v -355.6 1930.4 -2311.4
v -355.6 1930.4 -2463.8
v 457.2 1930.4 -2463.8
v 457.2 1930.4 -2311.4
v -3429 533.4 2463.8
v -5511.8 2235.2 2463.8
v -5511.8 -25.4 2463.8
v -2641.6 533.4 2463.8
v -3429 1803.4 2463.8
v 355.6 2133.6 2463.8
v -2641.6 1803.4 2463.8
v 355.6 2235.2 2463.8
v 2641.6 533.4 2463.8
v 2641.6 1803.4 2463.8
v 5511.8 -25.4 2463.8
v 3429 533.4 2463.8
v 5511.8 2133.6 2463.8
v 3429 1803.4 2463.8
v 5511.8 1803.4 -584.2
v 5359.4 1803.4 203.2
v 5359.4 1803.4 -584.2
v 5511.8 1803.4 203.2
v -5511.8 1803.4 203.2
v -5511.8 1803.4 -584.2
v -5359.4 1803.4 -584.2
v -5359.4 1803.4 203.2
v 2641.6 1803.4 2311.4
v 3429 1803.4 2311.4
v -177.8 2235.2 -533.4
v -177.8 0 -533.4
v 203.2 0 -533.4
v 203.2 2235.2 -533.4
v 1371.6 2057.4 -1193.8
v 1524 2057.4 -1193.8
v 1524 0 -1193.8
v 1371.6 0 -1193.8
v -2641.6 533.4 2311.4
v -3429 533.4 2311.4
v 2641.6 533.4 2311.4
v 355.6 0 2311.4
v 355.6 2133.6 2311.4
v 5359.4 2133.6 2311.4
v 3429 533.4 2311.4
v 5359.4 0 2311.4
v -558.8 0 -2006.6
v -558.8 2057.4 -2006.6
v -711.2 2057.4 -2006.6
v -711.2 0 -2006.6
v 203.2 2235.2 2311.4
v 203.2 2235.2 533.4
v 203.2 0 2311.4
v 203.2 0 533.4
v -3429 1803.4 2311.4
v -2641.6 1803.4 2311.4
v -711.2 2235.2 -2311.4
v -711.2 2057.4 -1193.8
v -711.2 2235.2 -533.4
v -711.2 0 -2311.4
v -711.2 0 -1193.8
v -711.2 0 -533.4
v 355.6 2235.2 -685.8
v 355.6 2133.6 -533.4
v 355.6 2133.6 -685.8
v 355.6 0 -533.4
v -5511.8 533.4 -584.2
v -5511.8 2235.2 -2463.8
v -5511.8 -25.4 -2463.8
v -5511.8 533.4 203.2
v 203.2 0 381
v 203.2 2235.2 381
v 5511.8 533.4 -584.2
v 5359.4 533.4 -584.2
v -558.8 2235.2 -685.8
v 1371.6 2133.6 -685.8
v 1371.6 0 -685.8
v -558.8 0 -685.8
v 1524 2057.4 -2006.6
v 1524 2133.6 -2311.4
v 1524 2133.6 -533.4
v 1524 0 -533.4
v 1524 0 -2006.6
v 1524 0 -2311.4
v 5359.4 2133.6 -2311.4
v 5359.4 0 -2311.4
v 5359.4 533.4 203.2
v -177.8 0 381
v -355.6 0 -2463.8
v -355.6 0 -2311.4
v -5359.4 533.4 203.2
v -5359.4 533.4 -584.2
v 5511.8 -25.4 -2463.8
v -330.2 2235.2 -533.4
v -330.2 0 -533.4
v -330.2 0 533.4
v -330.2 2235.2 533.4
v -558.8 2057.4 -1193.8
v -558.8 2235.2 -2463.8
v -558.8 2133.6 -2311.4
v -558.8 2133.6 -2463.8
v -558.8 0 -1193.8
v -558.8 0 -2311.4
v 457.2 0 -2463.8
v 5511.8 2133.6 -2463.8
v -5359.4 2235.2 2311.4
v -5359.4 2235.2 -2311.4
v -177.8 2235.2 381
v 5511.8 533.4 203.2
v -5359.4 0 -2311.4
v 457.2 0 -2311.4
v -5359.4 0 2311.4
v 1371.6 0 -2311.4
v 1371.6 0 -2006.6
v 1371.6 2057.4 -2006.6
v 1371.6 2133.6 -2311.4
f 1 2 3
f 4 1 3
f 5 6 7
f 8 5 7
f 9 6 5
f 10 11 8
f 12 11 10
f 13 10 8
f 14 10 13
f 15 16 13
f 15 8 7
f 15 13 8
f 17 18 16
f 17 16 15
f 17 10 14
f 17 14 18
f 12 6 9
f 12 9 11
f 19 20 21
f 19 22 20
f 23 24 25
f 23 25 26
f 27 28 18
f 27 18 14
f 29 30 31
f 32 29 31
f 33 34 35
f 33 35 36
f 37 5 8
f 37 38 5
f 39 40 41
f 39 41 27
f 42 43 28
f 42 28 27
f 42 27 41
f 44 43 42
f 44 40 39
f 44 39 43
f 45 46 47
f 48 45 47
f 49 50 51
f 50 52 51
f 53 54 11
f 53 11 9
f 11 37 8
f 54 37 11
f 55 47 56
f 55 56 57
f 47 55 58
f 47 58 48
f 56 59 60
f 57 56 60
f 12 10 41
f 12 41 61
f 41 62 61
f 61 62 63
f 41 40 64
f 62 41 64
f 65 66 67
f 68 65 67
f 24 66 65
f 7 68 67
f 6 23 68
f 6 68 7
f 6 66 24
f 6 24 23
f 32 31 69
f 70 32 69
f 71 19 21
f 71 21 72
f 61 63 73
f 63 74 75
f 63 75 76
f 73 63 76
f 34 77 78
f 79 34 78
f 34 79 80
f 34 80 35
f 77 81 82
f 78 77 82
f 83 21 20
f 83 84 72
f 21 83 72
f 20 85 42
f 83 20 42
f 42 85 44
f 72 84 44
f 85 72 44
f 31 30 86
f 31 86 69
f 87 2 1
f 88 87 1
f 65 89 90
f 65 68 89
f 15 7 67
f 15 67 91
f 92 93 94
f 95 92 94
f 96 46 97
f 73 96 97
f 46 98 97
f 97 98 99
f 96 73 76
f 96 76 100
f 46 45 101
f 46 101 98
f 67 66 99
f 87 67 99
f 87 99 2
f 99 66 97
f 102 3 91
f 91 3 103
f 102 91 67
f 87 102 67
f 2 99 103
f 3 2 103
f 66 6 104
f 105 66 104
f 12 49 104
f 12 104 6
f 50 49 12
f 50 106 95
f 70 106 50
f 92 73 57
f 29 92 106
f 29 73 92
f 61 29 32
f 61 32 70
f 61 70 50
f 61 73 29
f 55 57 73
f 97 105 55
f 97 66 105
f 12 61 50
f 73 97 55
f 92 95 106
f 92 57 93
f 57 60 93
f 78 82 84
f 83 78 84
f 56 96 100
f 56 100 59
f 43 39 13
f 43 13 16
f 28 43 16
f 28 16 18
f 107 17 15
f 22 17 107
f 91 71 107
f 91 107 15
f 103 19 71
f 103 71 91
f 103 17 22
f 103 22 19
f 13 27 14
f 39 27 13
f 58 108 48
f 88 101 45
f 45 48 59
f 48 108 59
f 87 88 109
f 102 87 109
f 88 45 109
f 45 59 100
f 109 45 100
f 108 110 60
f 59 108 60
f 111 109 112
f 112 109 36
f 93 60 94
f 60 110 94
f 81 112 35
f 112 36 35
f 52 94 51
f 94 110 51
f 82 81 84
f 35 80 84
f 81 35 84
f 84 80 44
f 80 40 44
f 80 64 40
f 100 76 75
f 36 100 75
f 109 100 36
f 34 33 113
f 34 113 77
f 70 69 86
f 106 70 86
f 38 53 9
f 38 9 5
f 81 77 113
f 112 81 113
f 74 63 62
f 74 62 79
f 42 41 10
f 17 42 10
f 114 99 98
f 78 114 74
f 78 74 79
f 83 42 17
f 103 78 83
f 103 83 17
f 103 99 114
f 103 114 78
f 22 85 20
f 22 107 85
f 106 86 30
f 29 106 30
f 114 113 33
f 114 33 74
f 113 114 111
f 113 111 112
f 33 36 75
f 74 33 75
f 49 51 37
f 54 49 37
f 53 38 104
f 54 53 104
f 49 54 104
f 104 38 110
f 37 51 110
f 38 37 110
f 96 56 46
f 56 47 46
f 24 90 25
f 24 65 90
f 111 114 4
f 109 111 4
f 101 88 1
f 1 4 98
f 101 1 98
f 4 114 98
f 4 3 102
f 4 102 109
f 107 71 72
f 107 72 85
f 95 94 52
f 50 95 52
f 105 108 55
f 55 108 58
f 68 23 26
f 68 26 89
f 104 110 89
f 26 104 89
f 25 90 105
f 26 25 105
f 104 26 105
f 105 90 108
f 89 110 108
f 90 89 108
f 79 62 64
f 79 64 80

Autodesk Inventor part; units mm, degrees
ref_plane "YZ Plane" through (0, 0, 0) normal (1, 0, 0) x (0, 1, 0)
ref_plane "XZ Plane" through (0, 0, 0) normal (0, 1, 0) x (-1, 0, 0)
ref_plane "XY Plane" through (0, 0, 0) normal (0, 0, 1) x (1, 0, 0)
sketch "Sketch1" plane through (0, 0, 0) normal (0, 1, 0) x (-1, 0, 0)
  line L0 (2008.4767, 2311.4) -> (5359.4, 2311.4)
  line L1 (-5511.8, 2463.8) -> (1195.6767, 2463.8)
  line L2 (2008.4767, 2463.8) -> (5511.8, 2463.8)
  line L3 (5359.4, 2311.4) -> (5359.4, -2311.4)
  line L4 (128.8767, 2311.4) -> (1195.6767, 2311.4)
  line L5 (2008.4767, 2311.4) -> (5359.4, 2311.4)
  line L6 (-5359.4, 2311.4) -> (-1041.4, 2311.4)
  line L7 (-5359.4, -2311.4) -> (-5359.4, 2311.4)
  line L8 (-988.7233, -2463.8) -> (-5306.7233, -2463.8)
  line L9 (5359.4, -2311.4) -> (1955.8, -2311.4)
  line L10 (355.6, -2463.8) -> (1143, -2463.8)
  line L11 (1955.8, -2463.8) -> (5359.4, -2463.8)
  line L12 (5359.4, 2311.4) -> (5359.4, -2311.4)
  line L13 (-5359.4, -2311.4) -> (-5359.4, 2311.4)
  line L14 (128.8767, 2311.4) -> (1195.6767, 2311.4)
  line L15 (-5359.4, 2311.4) -> (-1041.4, 2311.4)
  line L16 (1955.8, -2311.4) -> (5359.4, -2311.4)
  line L17 (5359.4, -2311.4) -> (5359.4, 2311.4)
  line L18 (5359.4, 2311.4) -> (2008.4767, 2311.4)
  line L19 (2008.4767, 2463.8) -> (5511.8, 2463.8)
  line L20 (-457.2, -2463.8) -> (-457.2, -2311.4)
  line L21 (355.6, -2463.8) -> (355.6, -2311.4)
  line L22 (-7716.52, 0) -> (7716.52, 0) projected
  line L23 (-5511.8, 2463.8) -> (-5511.8, -2463.8)
  line L24 (-5306.7233, -2463.8) -> (-5511.8, -2463.8)
  line L25 (5511.8, 2463.8) -> (5511.8, -2463.8)
  line L26 (5511.8, -2463.8) -> (5359.4, -2463.8)
  line L27 (-988.7233, -2463.8) -> (-457.2, -2463.8)
  line L28 (-1371.6, -685.8) -> (558.8, -685.8)
  line L29 (558.8, -2311.4) -> (355.6, -2311.4)
  line L30 (-457.2, -2311.4) -> (-1371.6, -2311.4)
  line L31 (-1371.6, -2311.4) -> (-457.2, -2311.4)
  line L32 (355.6, -2311.4) -> (558.8, -2311.4)
  line L33 (-355.6, -533.4) -> (-355.6, 2311.4)
  line L34 (1143, -2311.4) -> (1955.8, -2311.4)
  line L35 (1955.8, -2463.8) -> (1143, -2463.8)
  line L36 (0, -3449.32) -> (0, 3449.32) projected
  line L37 (1195.6767, 2463.8) -> (2008.4767, 2463.8)
  line L38 (2008.4767, 2311.4) -> (1195.6767, 2311.4)
  line L39 (355.6, -2463.8) -> (5511.8, -2463.8)
  line L40 (1143, -2311.4) -> (711.2, -2311.4)
  line L41 (558.8, -2311.4) -> (355.6, -2311.4)
  line L42 (-1041.4, -2311.4) -> (-1371.6, -2311.4)
  line L43 (-1524, -2311.4) -> (-5359.4, -2311.4)
  line L44 (-203.2, 533.4) -> (330.2, 533.4)
  line L45 (330.2, 533.4) -> (330.2, -533.4)
  line L46 (-1524, -2006.6) -> (-1371.6, -2006.6)
  line L47 (-1524, -1193.8) -> (-1371.6, -1193.8)
  line L48 (558.8, -1193.8) -> (711.2, -1193.8)
  line L49 (558.8, -2006.6) -> (711.2, -2006.6)
  line L50 (-1371.6, -2311.4) -> (-1371.6, -2006.6)
  line L51 (-1371.6, -1193.8) -> (-1371.6, -685.8)
  line L52 (-1524, -533.4) -> (-1524, -1193.8)
  line L53 (-1524, -2006.6) -> (-1524, -2311.4)
  line L54 (558.8, -685.8) -> (558.8, -1193.8)
  line L55 (558.8, -2006.6) -> (558.8, -2311.4)
  line L56 (711.2, -2311.4) -> (711.2, -2006.6)
  line L57 (711.2, -1193.8) -> (711.2, -533.4)
  line L58 (-203.2, -533.4) -> (177.8, -533.4)
  line L59 (177.8, -533.4) -> (177.8, 381)
  line L60 (177.8, 381) -> (-203.2, 381)
  line L61 (-203.2, 381) -> (-203.2, -533.4)
  line L62 (1195.6767, 2311.4) -> (-203.2, 2311.4)
  line L63 (-355.6, 2311.4) -> (-5359.4, 2311.4)
  line L64 (-23.5233, 2311.4) -> (-203.2, 2311.4)
  line L65 (-355.6, 2311.4) -> (-889, 2311.4)
  line L66 (-889, 2311.4) -> (-355.6, 2311.4)
  line L67 (-203.2, 2311.4) -> (-23.5233, 2311.4)
  line L68 (-203.2, 2311.4) -> (-203.2, 533.4)
  line L69 (-203.2, 381) -> (-203.2, -533.4)
  line L70 (711.2, -533.4) -> (330.2, -533.4)
  line L71 (177.8, -533.4) -> (-203.2, -533.4)
  line L72 (-355.6, -533.4) -> (-1524, -533.4)
  point P0 (0, 0)
  point P1 (0, 0)
  dimension "d0" = 152.4
  dimension "d8" = 152.4
  dimension "d12" = 11023.6
  dimension "d14" = 152.4
  dimension "d15" = 152.4
  dimension "d23" = 5054.6
  dimension "d29" = 4927.6
  dimension "d30" = 152.4
  dimension "d32" = 5029.2
  dimension "d33" = 304.8
  dimension "d34" = 1117.6
  dimension "d35" = 304.8
  dimension "d36" = 1117.6
  dimension "d37" = 152.4
  dimension "d38" = 3835.4
  dimension "d40" = 152.4
  dimension "d41" = 812.8
  dimension "d42" = 4648.2
  dimension "d73" = 152.4
  dimension "d74" = 152.4
  dimension "d75" = 152.4
  dimension "d77" = 2844.8
  dimension "d78" = 152.4
  dimension "d79" = 5562.6
  dimension "d80" = 1778
extrude "Extrusion12" add sketch "Sketch1" along normal blind 2133.6 contours L38 L4 L62 L36 L1 L37 L2 L25 L22 L3 L0 | L22 L25 L26 L11 L35 L10 L21 L29 L55 L49 L56 L40 L34 L9 L3 | L45 L70 L57 L48 L54 L28 L36 L58 L59 L22 | L22 L59 L60 L36 L44 L45 | L62 L68 L44 L36 L60 L61 L22 L33 L63 L6 L7 L23 L1 | L61 L58 L36 L28 L51 L47 L52 L72 L33 L22 | L22 L7 L43 L53 L46 L50 L30 L20 L27 L8 L24 L23
sketch "Sketch10" plane through (0, 0, 0) normal (0, -1, 0) x (1, 0, 0)
  line L0 (-5511.8, 2463.8) -> (5511.8, 2463.8)
  line L1 (5511.8, 2463.8) -> (5511.8, -2463.8)
  line L2 (5511.8, -2463.8) -> (-5511.8, -2463.8)
  line L3 (-5511.8, -2463.8) -> (-5511.8, 2463.8)
  point P0 (0, 0)
extrude "Extrusion13" add sketch "Sketch10" along normal blind 25.4
sketch "Sketch11" plane through (0, 2133.6, 0) normal (0, 1, 0) x (1, 0, 0)
  line L0 (1371.6, 685.8) -> (-558.8, 685.8) projected
  line L1 (-355.6, 2463.8) -> (-5511.8, 2463.8) projected
  line L2 (355.6, 533.4) -> (355.6, 685.8)
  line L3 (-558.8, 2463.8) -> (-558.8, 2311.4)
  line L4 (-558.8, 2006.6) -> (-711.2, 2006.6)
  line L5 (-711.2, 2006.6) -> (-711.2, 1193.8)
  line L6 (-711.2, 1193.8) -> (-558.8, 1193.8)
  line L7 (-558.8, 1193.8) -> (-558.8, 2006.6)
  line L8 (1371.6, 1193.8) -> (1524, 1193.8)
  line L9 (1524, 1193.8) -> (1524, 2006.6)
  line L10 (1524, 2006.6) -> (1371.6, 2006.6)
  line L11 (1371.6, 2006.6) -> (1371.6, 1193.8)
  line L12 (-5511.8, -2463.8) -> (5511.8, -2463.8) projected
  line L13 (355.6, -2311.4) -> (355.6, -2463.8)
  line L14 (203.2, 533.4) -> (203.2, -381) projected
  line L15 (203.2, -381) -> (-177.8, -381) projected
  line L16 (-177.8, -381) -> (-177.8, 533.4) projected
  line L17 (-177.8, 533.4) -> (203.2, 533.4) projected
  line L18 (-5511.8, -2463.8) -> (5511.8, -2463.8) projected
  line L19 (5511.8, -2463.8) -> (5511.8, 2463.8) projected
  line L20 (5511.8, 2463.8) -> (457.2, 2463.8) projected
  line L21 (457.2, 2463.8) -> (457.2, 2311.4) projected
  line L22 (457.2, 2311.4) -> (1371.6, 2311.4) projected
  line L23 (1371.6, 2311.4) -> (1371.6, 2006.6) projected
  line L24 (1371.6, 2006.6) -> (1524, 2006.6) projected
  line L25 (1524, 2006.6) -> (1524, 2311.4) projected
  line L26 (1524, 2311.4) -> (5359.4, 2311.4) projected
  line L27 (5359.4, 2311.4) -> (5359.4, -2311.4) projected
  line L28 (5359.4, -2311.4) -> (355.6, -2311.4) projected
  line L29 (355.6, -2311.4) -> (355.6, 533.4) projected
  line L30 (355.6, 533.4) -> (1524, 533.4) projected
  line L31 (1524, 533.4) -> (1524, 1193.8) projected
  line L32 (1524, 1193.8) -> (1371.6, 1193.8) projected
  line L33 (1371.6, 1193.8) -> (1371.6, 685.8) projected
  line L34 (1371.6, 685.8) -> (-558.8, 685.8) projected
  line L35 (-558.8, 685.8) -> (-558.8, 1193.8) projected
  line L36 (-558.8, 1193.8) -> (-711.2, 1193.8) projected
  line L37 (-711.2, 1193.8) -> (-711.2, 533.4) projected
  line L38 (-711.2, 533.4) -> (-330.2, 533.4) projected
  line L39 (-330.2, 533.4) -> (-330.2, -533.4) projected
  line L40 (-330.2, -533.4) -> (203.2, -533.4) projected
  line L41 (203.2, -533.4) -> (203.2, -2311.4) projected
  line L42 (203.2, -2311.4) -> (-5359.4, -2311.4) projected
  line L43 (-5359.4, -2311.4) -> (-5359.4, 2311.4) projected
  line L44 (-5359.4, 2311.4) -> (-711.2, 2311.4) projected
  line L45 (-711.2, 2311.4) -> (-711.2, 2006.6) projected
  line L46 (-711.2, 2006.6) -> (-558.8, 2006.6) projected
  line L47 (-558.8, 2006.6) -> (-558.8, 2311.4) projected
  line L48 (-355.6, 2311.4) -> (-355.6, 2463.8) projected
  line L49 (-355.6, 2463.8) -> (-5511.8, 2463.8) projected
  line L50 (-5511.8, 2463.8) -> (-5511.8, -2463.8) projected
  line L51 (-558.8, 2006.6) -> (-558.8, 2463.8)
  line L52 (355.6, 685.8) -> (355.6, -2463.8)
  line L53 (355.6, 685.8) -> (-558.8, 685.8)
  line L54 (-558.8, 685.8) -> (-558.8, 2463.8)
  line L55 (-330.2, 533.4) -> (-330.2, -533.4) projected
  line L56 (-558.8, 2463.8) -> (-711.2, 2463.8)
  line L57 (-711.2, 2463.8) -> (-711.2, 533.4)
  line L58 (-711.2, 533.4) -> (-558.8, 533.4)
  line L59 (-558.8, 533.4) -> (-558.8, 2463.8)
  line L60 (-558.8, 533.4) -> (355.6, 533.4)
  line L61 (355.6, 533.4) -> (355.6, 685.8)
  line L62 (355.6, 685.8) -> (-558.8, 685.8)
  line L63 (-558.8, 685.8) -> (-558.8, 533.4)
  line L64 (355.6, 685.8) -> (203.2, 685.8)
  line L65 (203.2, 685.8) -> (203.2, -2463.8)
  line L66 (203.2, -2463.8) -> (355.6, -2463.8)
  line L67 (355.6, -2463.8) -> (355.6, 685.8)
  line L68 (203.2, -533.4) -> (-330.2, -533.4)
  line L69 (-330.2, -533.4) -> (-330.2, -368.3)
  line L70 (-330.2, -368.3) -> (203.2, -368.3)
  line L71 (203.2, -368.3) -> (203.2, -533.4)
  line L72 (-330.2, 533.4) -> (-177.8, 533.4)
  line L73 (-177.8, 533.4) -> (-177.8, -533.4)
  line L74 (-177.8, -533.4) -> (-330.2, -533.4)
  line L75 (-330.2, -533.4) -> (-330.2, 533.4)
  line L76 (-558.8, 2311.4) -> (-5511.8, 2311.4)
  line L77 (-5511.8, 2311.4) -> (-5511.8, 2463.8)
  line L78 (-5511.8, 2463.8) -> (-558.8, 2463.8)
  line L79 (-558.8, 2463.8) -> (-558.8, 2311.4)
  line L80 (-558.8, 2311.4) -> (-355.6, 2311.4) projected
  line L81 (-355.6, 2463.8) -> (457.2, 2463.8)
  line L82 (457.2, 2463.8) -> (457.2, 2311.4)
  line L83 (457.2, 2311.4) -> (-355.6, 2311.4)
  line L84 (-355.6, 2311.4) -> (-355.6, 2463.8)
  point P0 (0, 2298.7)
  point P1 (0, 2451.1)
  point P2 (0, 0)
extrude "Extrusion15" add sketch "Sketch11" against normal blind 76.2 contours L11 L10 L9 L8 | L6 L5 L4 L7
extrude "Extrusion16" add sketch "Sketch11" along normal blind 101.6 contours L2 L60 L65 L0 | L65 L17 L60 L38 L59 L0 | L29 L13 L12 L65 L41 L14 L60 | L59 L38 L37 L6 L35 | L6 L5 L4 L7 | L16 L70 L39 L60 | L4 L45 L76 L47 | L65 L40 L73 L15 | L16 L73 L40 L39 L70 | L12 L50 L76 L43 L42 L65 | L76 L57 L1 L3 | L44 L76 L50 L1 L57
extrude "Extrusion17" add sketch "Sketch11" along normal blind 101.6 contours L2 L60 L65 L0 | L65 L17 L60 L38 L59 L0
sketch "Sketch12" plane through (5511.8, 2133.6, 2463.8) normal (1, 0, 0) x (0, 0, -1)
  line L0 (4927.6, -2159) -> (4927.6, 0) projected
  line L1 (0, 0) -> (4927.6, 0) projected
  line L2 (4775.2, -2133.6) -> (152.4, -2133.6) projected
  line L3 (4775.2, -2133.6) -> (152.4, -2133.6) projected
  line L4 (152.4, -2133.6) -> (152.4, 0) projected
  line L5 (4775.2, 0) -> (152.4, 0) projected
  line L6 (4775.2, -2133.6) -> (4775.2, 0) projected
  line L7 (2260.6, -330.2) -> (3048, -330.2)
  line L8 (3048, -330.2) -> (3048, -1600.2)
  line L9 (3048, -1600.2) -> (2260.6, -1600.2)
  line L10 (2260.6, -1600.2) -> (2260.6, -330.2)
  point P0 (2463.8, -2133.6)
  dimension "d93" = 1879.6
  dimension "d94" = 787.4
  dimension "d95" = 330.2
  dimension "d96" = 533.4
extrude "Extrusion18" cut sketch "Sketch12" against normal up to surface (152.4 mm away) contours L7 L8 L9 L10
sketch "Sketch13" plane through (5359.4, 2133.6, 2311.4) normal (0, 0, -1) x (-1, 0, 0)
  line L0 (0, -2133.6) -> (5003.8, -2133.6) projected
  line L1 (0, 0) -> (5003.8, 0) projected
  line L2 (-152.4, -2159) -> (-152.4, 0) projected
  line L3 (5003.8, 0) -> (-152.4, 0) projected
  line L4 (5003.8, 0) -> (5003.8, 101.6) projected
  line L5 (10871.2, 101.6) -> (5003.8, 101.6) projected
  line L6 (10871.2, 101.6) -> (10871.2, -2159) projected
  line L7 (-152.4, -2159) -> (10871.2, -2159) projected
  line L8 (1930.4, -330.2) -> (2717.8, -330.2)
  line L9 (2717.8, -330.2) -> (2717.8, -1600.2)
  line L10 (2717.8, -1600.2) -> (1930.4, -1600.2)
  line L11 (1930.4, -1600.2) -> (1930.4, -330.2)
  point P0 (5359.4, -2133.6)
  dimension "d99" = 2082.8
  dimension "d100" = 787.4
  dimension "d101" = 330.2
  dimension "d102" = 533.4
extrude "Extrusion19" cut sketch "Sketch13" against normal up to surface (152.4 mm away) contours L8 L9 L10 L11
mirror "Mirror3" about plane through (0, 0, 0) normal (1, 0, 0) of "Extrusion18", "Extrusion19"
extrude "Extrusion20" add sketch "Sketch11" against normal blind 203.2 contours L83 L48 L81 L21
properties part number "489 Forest 2nd Floor"
